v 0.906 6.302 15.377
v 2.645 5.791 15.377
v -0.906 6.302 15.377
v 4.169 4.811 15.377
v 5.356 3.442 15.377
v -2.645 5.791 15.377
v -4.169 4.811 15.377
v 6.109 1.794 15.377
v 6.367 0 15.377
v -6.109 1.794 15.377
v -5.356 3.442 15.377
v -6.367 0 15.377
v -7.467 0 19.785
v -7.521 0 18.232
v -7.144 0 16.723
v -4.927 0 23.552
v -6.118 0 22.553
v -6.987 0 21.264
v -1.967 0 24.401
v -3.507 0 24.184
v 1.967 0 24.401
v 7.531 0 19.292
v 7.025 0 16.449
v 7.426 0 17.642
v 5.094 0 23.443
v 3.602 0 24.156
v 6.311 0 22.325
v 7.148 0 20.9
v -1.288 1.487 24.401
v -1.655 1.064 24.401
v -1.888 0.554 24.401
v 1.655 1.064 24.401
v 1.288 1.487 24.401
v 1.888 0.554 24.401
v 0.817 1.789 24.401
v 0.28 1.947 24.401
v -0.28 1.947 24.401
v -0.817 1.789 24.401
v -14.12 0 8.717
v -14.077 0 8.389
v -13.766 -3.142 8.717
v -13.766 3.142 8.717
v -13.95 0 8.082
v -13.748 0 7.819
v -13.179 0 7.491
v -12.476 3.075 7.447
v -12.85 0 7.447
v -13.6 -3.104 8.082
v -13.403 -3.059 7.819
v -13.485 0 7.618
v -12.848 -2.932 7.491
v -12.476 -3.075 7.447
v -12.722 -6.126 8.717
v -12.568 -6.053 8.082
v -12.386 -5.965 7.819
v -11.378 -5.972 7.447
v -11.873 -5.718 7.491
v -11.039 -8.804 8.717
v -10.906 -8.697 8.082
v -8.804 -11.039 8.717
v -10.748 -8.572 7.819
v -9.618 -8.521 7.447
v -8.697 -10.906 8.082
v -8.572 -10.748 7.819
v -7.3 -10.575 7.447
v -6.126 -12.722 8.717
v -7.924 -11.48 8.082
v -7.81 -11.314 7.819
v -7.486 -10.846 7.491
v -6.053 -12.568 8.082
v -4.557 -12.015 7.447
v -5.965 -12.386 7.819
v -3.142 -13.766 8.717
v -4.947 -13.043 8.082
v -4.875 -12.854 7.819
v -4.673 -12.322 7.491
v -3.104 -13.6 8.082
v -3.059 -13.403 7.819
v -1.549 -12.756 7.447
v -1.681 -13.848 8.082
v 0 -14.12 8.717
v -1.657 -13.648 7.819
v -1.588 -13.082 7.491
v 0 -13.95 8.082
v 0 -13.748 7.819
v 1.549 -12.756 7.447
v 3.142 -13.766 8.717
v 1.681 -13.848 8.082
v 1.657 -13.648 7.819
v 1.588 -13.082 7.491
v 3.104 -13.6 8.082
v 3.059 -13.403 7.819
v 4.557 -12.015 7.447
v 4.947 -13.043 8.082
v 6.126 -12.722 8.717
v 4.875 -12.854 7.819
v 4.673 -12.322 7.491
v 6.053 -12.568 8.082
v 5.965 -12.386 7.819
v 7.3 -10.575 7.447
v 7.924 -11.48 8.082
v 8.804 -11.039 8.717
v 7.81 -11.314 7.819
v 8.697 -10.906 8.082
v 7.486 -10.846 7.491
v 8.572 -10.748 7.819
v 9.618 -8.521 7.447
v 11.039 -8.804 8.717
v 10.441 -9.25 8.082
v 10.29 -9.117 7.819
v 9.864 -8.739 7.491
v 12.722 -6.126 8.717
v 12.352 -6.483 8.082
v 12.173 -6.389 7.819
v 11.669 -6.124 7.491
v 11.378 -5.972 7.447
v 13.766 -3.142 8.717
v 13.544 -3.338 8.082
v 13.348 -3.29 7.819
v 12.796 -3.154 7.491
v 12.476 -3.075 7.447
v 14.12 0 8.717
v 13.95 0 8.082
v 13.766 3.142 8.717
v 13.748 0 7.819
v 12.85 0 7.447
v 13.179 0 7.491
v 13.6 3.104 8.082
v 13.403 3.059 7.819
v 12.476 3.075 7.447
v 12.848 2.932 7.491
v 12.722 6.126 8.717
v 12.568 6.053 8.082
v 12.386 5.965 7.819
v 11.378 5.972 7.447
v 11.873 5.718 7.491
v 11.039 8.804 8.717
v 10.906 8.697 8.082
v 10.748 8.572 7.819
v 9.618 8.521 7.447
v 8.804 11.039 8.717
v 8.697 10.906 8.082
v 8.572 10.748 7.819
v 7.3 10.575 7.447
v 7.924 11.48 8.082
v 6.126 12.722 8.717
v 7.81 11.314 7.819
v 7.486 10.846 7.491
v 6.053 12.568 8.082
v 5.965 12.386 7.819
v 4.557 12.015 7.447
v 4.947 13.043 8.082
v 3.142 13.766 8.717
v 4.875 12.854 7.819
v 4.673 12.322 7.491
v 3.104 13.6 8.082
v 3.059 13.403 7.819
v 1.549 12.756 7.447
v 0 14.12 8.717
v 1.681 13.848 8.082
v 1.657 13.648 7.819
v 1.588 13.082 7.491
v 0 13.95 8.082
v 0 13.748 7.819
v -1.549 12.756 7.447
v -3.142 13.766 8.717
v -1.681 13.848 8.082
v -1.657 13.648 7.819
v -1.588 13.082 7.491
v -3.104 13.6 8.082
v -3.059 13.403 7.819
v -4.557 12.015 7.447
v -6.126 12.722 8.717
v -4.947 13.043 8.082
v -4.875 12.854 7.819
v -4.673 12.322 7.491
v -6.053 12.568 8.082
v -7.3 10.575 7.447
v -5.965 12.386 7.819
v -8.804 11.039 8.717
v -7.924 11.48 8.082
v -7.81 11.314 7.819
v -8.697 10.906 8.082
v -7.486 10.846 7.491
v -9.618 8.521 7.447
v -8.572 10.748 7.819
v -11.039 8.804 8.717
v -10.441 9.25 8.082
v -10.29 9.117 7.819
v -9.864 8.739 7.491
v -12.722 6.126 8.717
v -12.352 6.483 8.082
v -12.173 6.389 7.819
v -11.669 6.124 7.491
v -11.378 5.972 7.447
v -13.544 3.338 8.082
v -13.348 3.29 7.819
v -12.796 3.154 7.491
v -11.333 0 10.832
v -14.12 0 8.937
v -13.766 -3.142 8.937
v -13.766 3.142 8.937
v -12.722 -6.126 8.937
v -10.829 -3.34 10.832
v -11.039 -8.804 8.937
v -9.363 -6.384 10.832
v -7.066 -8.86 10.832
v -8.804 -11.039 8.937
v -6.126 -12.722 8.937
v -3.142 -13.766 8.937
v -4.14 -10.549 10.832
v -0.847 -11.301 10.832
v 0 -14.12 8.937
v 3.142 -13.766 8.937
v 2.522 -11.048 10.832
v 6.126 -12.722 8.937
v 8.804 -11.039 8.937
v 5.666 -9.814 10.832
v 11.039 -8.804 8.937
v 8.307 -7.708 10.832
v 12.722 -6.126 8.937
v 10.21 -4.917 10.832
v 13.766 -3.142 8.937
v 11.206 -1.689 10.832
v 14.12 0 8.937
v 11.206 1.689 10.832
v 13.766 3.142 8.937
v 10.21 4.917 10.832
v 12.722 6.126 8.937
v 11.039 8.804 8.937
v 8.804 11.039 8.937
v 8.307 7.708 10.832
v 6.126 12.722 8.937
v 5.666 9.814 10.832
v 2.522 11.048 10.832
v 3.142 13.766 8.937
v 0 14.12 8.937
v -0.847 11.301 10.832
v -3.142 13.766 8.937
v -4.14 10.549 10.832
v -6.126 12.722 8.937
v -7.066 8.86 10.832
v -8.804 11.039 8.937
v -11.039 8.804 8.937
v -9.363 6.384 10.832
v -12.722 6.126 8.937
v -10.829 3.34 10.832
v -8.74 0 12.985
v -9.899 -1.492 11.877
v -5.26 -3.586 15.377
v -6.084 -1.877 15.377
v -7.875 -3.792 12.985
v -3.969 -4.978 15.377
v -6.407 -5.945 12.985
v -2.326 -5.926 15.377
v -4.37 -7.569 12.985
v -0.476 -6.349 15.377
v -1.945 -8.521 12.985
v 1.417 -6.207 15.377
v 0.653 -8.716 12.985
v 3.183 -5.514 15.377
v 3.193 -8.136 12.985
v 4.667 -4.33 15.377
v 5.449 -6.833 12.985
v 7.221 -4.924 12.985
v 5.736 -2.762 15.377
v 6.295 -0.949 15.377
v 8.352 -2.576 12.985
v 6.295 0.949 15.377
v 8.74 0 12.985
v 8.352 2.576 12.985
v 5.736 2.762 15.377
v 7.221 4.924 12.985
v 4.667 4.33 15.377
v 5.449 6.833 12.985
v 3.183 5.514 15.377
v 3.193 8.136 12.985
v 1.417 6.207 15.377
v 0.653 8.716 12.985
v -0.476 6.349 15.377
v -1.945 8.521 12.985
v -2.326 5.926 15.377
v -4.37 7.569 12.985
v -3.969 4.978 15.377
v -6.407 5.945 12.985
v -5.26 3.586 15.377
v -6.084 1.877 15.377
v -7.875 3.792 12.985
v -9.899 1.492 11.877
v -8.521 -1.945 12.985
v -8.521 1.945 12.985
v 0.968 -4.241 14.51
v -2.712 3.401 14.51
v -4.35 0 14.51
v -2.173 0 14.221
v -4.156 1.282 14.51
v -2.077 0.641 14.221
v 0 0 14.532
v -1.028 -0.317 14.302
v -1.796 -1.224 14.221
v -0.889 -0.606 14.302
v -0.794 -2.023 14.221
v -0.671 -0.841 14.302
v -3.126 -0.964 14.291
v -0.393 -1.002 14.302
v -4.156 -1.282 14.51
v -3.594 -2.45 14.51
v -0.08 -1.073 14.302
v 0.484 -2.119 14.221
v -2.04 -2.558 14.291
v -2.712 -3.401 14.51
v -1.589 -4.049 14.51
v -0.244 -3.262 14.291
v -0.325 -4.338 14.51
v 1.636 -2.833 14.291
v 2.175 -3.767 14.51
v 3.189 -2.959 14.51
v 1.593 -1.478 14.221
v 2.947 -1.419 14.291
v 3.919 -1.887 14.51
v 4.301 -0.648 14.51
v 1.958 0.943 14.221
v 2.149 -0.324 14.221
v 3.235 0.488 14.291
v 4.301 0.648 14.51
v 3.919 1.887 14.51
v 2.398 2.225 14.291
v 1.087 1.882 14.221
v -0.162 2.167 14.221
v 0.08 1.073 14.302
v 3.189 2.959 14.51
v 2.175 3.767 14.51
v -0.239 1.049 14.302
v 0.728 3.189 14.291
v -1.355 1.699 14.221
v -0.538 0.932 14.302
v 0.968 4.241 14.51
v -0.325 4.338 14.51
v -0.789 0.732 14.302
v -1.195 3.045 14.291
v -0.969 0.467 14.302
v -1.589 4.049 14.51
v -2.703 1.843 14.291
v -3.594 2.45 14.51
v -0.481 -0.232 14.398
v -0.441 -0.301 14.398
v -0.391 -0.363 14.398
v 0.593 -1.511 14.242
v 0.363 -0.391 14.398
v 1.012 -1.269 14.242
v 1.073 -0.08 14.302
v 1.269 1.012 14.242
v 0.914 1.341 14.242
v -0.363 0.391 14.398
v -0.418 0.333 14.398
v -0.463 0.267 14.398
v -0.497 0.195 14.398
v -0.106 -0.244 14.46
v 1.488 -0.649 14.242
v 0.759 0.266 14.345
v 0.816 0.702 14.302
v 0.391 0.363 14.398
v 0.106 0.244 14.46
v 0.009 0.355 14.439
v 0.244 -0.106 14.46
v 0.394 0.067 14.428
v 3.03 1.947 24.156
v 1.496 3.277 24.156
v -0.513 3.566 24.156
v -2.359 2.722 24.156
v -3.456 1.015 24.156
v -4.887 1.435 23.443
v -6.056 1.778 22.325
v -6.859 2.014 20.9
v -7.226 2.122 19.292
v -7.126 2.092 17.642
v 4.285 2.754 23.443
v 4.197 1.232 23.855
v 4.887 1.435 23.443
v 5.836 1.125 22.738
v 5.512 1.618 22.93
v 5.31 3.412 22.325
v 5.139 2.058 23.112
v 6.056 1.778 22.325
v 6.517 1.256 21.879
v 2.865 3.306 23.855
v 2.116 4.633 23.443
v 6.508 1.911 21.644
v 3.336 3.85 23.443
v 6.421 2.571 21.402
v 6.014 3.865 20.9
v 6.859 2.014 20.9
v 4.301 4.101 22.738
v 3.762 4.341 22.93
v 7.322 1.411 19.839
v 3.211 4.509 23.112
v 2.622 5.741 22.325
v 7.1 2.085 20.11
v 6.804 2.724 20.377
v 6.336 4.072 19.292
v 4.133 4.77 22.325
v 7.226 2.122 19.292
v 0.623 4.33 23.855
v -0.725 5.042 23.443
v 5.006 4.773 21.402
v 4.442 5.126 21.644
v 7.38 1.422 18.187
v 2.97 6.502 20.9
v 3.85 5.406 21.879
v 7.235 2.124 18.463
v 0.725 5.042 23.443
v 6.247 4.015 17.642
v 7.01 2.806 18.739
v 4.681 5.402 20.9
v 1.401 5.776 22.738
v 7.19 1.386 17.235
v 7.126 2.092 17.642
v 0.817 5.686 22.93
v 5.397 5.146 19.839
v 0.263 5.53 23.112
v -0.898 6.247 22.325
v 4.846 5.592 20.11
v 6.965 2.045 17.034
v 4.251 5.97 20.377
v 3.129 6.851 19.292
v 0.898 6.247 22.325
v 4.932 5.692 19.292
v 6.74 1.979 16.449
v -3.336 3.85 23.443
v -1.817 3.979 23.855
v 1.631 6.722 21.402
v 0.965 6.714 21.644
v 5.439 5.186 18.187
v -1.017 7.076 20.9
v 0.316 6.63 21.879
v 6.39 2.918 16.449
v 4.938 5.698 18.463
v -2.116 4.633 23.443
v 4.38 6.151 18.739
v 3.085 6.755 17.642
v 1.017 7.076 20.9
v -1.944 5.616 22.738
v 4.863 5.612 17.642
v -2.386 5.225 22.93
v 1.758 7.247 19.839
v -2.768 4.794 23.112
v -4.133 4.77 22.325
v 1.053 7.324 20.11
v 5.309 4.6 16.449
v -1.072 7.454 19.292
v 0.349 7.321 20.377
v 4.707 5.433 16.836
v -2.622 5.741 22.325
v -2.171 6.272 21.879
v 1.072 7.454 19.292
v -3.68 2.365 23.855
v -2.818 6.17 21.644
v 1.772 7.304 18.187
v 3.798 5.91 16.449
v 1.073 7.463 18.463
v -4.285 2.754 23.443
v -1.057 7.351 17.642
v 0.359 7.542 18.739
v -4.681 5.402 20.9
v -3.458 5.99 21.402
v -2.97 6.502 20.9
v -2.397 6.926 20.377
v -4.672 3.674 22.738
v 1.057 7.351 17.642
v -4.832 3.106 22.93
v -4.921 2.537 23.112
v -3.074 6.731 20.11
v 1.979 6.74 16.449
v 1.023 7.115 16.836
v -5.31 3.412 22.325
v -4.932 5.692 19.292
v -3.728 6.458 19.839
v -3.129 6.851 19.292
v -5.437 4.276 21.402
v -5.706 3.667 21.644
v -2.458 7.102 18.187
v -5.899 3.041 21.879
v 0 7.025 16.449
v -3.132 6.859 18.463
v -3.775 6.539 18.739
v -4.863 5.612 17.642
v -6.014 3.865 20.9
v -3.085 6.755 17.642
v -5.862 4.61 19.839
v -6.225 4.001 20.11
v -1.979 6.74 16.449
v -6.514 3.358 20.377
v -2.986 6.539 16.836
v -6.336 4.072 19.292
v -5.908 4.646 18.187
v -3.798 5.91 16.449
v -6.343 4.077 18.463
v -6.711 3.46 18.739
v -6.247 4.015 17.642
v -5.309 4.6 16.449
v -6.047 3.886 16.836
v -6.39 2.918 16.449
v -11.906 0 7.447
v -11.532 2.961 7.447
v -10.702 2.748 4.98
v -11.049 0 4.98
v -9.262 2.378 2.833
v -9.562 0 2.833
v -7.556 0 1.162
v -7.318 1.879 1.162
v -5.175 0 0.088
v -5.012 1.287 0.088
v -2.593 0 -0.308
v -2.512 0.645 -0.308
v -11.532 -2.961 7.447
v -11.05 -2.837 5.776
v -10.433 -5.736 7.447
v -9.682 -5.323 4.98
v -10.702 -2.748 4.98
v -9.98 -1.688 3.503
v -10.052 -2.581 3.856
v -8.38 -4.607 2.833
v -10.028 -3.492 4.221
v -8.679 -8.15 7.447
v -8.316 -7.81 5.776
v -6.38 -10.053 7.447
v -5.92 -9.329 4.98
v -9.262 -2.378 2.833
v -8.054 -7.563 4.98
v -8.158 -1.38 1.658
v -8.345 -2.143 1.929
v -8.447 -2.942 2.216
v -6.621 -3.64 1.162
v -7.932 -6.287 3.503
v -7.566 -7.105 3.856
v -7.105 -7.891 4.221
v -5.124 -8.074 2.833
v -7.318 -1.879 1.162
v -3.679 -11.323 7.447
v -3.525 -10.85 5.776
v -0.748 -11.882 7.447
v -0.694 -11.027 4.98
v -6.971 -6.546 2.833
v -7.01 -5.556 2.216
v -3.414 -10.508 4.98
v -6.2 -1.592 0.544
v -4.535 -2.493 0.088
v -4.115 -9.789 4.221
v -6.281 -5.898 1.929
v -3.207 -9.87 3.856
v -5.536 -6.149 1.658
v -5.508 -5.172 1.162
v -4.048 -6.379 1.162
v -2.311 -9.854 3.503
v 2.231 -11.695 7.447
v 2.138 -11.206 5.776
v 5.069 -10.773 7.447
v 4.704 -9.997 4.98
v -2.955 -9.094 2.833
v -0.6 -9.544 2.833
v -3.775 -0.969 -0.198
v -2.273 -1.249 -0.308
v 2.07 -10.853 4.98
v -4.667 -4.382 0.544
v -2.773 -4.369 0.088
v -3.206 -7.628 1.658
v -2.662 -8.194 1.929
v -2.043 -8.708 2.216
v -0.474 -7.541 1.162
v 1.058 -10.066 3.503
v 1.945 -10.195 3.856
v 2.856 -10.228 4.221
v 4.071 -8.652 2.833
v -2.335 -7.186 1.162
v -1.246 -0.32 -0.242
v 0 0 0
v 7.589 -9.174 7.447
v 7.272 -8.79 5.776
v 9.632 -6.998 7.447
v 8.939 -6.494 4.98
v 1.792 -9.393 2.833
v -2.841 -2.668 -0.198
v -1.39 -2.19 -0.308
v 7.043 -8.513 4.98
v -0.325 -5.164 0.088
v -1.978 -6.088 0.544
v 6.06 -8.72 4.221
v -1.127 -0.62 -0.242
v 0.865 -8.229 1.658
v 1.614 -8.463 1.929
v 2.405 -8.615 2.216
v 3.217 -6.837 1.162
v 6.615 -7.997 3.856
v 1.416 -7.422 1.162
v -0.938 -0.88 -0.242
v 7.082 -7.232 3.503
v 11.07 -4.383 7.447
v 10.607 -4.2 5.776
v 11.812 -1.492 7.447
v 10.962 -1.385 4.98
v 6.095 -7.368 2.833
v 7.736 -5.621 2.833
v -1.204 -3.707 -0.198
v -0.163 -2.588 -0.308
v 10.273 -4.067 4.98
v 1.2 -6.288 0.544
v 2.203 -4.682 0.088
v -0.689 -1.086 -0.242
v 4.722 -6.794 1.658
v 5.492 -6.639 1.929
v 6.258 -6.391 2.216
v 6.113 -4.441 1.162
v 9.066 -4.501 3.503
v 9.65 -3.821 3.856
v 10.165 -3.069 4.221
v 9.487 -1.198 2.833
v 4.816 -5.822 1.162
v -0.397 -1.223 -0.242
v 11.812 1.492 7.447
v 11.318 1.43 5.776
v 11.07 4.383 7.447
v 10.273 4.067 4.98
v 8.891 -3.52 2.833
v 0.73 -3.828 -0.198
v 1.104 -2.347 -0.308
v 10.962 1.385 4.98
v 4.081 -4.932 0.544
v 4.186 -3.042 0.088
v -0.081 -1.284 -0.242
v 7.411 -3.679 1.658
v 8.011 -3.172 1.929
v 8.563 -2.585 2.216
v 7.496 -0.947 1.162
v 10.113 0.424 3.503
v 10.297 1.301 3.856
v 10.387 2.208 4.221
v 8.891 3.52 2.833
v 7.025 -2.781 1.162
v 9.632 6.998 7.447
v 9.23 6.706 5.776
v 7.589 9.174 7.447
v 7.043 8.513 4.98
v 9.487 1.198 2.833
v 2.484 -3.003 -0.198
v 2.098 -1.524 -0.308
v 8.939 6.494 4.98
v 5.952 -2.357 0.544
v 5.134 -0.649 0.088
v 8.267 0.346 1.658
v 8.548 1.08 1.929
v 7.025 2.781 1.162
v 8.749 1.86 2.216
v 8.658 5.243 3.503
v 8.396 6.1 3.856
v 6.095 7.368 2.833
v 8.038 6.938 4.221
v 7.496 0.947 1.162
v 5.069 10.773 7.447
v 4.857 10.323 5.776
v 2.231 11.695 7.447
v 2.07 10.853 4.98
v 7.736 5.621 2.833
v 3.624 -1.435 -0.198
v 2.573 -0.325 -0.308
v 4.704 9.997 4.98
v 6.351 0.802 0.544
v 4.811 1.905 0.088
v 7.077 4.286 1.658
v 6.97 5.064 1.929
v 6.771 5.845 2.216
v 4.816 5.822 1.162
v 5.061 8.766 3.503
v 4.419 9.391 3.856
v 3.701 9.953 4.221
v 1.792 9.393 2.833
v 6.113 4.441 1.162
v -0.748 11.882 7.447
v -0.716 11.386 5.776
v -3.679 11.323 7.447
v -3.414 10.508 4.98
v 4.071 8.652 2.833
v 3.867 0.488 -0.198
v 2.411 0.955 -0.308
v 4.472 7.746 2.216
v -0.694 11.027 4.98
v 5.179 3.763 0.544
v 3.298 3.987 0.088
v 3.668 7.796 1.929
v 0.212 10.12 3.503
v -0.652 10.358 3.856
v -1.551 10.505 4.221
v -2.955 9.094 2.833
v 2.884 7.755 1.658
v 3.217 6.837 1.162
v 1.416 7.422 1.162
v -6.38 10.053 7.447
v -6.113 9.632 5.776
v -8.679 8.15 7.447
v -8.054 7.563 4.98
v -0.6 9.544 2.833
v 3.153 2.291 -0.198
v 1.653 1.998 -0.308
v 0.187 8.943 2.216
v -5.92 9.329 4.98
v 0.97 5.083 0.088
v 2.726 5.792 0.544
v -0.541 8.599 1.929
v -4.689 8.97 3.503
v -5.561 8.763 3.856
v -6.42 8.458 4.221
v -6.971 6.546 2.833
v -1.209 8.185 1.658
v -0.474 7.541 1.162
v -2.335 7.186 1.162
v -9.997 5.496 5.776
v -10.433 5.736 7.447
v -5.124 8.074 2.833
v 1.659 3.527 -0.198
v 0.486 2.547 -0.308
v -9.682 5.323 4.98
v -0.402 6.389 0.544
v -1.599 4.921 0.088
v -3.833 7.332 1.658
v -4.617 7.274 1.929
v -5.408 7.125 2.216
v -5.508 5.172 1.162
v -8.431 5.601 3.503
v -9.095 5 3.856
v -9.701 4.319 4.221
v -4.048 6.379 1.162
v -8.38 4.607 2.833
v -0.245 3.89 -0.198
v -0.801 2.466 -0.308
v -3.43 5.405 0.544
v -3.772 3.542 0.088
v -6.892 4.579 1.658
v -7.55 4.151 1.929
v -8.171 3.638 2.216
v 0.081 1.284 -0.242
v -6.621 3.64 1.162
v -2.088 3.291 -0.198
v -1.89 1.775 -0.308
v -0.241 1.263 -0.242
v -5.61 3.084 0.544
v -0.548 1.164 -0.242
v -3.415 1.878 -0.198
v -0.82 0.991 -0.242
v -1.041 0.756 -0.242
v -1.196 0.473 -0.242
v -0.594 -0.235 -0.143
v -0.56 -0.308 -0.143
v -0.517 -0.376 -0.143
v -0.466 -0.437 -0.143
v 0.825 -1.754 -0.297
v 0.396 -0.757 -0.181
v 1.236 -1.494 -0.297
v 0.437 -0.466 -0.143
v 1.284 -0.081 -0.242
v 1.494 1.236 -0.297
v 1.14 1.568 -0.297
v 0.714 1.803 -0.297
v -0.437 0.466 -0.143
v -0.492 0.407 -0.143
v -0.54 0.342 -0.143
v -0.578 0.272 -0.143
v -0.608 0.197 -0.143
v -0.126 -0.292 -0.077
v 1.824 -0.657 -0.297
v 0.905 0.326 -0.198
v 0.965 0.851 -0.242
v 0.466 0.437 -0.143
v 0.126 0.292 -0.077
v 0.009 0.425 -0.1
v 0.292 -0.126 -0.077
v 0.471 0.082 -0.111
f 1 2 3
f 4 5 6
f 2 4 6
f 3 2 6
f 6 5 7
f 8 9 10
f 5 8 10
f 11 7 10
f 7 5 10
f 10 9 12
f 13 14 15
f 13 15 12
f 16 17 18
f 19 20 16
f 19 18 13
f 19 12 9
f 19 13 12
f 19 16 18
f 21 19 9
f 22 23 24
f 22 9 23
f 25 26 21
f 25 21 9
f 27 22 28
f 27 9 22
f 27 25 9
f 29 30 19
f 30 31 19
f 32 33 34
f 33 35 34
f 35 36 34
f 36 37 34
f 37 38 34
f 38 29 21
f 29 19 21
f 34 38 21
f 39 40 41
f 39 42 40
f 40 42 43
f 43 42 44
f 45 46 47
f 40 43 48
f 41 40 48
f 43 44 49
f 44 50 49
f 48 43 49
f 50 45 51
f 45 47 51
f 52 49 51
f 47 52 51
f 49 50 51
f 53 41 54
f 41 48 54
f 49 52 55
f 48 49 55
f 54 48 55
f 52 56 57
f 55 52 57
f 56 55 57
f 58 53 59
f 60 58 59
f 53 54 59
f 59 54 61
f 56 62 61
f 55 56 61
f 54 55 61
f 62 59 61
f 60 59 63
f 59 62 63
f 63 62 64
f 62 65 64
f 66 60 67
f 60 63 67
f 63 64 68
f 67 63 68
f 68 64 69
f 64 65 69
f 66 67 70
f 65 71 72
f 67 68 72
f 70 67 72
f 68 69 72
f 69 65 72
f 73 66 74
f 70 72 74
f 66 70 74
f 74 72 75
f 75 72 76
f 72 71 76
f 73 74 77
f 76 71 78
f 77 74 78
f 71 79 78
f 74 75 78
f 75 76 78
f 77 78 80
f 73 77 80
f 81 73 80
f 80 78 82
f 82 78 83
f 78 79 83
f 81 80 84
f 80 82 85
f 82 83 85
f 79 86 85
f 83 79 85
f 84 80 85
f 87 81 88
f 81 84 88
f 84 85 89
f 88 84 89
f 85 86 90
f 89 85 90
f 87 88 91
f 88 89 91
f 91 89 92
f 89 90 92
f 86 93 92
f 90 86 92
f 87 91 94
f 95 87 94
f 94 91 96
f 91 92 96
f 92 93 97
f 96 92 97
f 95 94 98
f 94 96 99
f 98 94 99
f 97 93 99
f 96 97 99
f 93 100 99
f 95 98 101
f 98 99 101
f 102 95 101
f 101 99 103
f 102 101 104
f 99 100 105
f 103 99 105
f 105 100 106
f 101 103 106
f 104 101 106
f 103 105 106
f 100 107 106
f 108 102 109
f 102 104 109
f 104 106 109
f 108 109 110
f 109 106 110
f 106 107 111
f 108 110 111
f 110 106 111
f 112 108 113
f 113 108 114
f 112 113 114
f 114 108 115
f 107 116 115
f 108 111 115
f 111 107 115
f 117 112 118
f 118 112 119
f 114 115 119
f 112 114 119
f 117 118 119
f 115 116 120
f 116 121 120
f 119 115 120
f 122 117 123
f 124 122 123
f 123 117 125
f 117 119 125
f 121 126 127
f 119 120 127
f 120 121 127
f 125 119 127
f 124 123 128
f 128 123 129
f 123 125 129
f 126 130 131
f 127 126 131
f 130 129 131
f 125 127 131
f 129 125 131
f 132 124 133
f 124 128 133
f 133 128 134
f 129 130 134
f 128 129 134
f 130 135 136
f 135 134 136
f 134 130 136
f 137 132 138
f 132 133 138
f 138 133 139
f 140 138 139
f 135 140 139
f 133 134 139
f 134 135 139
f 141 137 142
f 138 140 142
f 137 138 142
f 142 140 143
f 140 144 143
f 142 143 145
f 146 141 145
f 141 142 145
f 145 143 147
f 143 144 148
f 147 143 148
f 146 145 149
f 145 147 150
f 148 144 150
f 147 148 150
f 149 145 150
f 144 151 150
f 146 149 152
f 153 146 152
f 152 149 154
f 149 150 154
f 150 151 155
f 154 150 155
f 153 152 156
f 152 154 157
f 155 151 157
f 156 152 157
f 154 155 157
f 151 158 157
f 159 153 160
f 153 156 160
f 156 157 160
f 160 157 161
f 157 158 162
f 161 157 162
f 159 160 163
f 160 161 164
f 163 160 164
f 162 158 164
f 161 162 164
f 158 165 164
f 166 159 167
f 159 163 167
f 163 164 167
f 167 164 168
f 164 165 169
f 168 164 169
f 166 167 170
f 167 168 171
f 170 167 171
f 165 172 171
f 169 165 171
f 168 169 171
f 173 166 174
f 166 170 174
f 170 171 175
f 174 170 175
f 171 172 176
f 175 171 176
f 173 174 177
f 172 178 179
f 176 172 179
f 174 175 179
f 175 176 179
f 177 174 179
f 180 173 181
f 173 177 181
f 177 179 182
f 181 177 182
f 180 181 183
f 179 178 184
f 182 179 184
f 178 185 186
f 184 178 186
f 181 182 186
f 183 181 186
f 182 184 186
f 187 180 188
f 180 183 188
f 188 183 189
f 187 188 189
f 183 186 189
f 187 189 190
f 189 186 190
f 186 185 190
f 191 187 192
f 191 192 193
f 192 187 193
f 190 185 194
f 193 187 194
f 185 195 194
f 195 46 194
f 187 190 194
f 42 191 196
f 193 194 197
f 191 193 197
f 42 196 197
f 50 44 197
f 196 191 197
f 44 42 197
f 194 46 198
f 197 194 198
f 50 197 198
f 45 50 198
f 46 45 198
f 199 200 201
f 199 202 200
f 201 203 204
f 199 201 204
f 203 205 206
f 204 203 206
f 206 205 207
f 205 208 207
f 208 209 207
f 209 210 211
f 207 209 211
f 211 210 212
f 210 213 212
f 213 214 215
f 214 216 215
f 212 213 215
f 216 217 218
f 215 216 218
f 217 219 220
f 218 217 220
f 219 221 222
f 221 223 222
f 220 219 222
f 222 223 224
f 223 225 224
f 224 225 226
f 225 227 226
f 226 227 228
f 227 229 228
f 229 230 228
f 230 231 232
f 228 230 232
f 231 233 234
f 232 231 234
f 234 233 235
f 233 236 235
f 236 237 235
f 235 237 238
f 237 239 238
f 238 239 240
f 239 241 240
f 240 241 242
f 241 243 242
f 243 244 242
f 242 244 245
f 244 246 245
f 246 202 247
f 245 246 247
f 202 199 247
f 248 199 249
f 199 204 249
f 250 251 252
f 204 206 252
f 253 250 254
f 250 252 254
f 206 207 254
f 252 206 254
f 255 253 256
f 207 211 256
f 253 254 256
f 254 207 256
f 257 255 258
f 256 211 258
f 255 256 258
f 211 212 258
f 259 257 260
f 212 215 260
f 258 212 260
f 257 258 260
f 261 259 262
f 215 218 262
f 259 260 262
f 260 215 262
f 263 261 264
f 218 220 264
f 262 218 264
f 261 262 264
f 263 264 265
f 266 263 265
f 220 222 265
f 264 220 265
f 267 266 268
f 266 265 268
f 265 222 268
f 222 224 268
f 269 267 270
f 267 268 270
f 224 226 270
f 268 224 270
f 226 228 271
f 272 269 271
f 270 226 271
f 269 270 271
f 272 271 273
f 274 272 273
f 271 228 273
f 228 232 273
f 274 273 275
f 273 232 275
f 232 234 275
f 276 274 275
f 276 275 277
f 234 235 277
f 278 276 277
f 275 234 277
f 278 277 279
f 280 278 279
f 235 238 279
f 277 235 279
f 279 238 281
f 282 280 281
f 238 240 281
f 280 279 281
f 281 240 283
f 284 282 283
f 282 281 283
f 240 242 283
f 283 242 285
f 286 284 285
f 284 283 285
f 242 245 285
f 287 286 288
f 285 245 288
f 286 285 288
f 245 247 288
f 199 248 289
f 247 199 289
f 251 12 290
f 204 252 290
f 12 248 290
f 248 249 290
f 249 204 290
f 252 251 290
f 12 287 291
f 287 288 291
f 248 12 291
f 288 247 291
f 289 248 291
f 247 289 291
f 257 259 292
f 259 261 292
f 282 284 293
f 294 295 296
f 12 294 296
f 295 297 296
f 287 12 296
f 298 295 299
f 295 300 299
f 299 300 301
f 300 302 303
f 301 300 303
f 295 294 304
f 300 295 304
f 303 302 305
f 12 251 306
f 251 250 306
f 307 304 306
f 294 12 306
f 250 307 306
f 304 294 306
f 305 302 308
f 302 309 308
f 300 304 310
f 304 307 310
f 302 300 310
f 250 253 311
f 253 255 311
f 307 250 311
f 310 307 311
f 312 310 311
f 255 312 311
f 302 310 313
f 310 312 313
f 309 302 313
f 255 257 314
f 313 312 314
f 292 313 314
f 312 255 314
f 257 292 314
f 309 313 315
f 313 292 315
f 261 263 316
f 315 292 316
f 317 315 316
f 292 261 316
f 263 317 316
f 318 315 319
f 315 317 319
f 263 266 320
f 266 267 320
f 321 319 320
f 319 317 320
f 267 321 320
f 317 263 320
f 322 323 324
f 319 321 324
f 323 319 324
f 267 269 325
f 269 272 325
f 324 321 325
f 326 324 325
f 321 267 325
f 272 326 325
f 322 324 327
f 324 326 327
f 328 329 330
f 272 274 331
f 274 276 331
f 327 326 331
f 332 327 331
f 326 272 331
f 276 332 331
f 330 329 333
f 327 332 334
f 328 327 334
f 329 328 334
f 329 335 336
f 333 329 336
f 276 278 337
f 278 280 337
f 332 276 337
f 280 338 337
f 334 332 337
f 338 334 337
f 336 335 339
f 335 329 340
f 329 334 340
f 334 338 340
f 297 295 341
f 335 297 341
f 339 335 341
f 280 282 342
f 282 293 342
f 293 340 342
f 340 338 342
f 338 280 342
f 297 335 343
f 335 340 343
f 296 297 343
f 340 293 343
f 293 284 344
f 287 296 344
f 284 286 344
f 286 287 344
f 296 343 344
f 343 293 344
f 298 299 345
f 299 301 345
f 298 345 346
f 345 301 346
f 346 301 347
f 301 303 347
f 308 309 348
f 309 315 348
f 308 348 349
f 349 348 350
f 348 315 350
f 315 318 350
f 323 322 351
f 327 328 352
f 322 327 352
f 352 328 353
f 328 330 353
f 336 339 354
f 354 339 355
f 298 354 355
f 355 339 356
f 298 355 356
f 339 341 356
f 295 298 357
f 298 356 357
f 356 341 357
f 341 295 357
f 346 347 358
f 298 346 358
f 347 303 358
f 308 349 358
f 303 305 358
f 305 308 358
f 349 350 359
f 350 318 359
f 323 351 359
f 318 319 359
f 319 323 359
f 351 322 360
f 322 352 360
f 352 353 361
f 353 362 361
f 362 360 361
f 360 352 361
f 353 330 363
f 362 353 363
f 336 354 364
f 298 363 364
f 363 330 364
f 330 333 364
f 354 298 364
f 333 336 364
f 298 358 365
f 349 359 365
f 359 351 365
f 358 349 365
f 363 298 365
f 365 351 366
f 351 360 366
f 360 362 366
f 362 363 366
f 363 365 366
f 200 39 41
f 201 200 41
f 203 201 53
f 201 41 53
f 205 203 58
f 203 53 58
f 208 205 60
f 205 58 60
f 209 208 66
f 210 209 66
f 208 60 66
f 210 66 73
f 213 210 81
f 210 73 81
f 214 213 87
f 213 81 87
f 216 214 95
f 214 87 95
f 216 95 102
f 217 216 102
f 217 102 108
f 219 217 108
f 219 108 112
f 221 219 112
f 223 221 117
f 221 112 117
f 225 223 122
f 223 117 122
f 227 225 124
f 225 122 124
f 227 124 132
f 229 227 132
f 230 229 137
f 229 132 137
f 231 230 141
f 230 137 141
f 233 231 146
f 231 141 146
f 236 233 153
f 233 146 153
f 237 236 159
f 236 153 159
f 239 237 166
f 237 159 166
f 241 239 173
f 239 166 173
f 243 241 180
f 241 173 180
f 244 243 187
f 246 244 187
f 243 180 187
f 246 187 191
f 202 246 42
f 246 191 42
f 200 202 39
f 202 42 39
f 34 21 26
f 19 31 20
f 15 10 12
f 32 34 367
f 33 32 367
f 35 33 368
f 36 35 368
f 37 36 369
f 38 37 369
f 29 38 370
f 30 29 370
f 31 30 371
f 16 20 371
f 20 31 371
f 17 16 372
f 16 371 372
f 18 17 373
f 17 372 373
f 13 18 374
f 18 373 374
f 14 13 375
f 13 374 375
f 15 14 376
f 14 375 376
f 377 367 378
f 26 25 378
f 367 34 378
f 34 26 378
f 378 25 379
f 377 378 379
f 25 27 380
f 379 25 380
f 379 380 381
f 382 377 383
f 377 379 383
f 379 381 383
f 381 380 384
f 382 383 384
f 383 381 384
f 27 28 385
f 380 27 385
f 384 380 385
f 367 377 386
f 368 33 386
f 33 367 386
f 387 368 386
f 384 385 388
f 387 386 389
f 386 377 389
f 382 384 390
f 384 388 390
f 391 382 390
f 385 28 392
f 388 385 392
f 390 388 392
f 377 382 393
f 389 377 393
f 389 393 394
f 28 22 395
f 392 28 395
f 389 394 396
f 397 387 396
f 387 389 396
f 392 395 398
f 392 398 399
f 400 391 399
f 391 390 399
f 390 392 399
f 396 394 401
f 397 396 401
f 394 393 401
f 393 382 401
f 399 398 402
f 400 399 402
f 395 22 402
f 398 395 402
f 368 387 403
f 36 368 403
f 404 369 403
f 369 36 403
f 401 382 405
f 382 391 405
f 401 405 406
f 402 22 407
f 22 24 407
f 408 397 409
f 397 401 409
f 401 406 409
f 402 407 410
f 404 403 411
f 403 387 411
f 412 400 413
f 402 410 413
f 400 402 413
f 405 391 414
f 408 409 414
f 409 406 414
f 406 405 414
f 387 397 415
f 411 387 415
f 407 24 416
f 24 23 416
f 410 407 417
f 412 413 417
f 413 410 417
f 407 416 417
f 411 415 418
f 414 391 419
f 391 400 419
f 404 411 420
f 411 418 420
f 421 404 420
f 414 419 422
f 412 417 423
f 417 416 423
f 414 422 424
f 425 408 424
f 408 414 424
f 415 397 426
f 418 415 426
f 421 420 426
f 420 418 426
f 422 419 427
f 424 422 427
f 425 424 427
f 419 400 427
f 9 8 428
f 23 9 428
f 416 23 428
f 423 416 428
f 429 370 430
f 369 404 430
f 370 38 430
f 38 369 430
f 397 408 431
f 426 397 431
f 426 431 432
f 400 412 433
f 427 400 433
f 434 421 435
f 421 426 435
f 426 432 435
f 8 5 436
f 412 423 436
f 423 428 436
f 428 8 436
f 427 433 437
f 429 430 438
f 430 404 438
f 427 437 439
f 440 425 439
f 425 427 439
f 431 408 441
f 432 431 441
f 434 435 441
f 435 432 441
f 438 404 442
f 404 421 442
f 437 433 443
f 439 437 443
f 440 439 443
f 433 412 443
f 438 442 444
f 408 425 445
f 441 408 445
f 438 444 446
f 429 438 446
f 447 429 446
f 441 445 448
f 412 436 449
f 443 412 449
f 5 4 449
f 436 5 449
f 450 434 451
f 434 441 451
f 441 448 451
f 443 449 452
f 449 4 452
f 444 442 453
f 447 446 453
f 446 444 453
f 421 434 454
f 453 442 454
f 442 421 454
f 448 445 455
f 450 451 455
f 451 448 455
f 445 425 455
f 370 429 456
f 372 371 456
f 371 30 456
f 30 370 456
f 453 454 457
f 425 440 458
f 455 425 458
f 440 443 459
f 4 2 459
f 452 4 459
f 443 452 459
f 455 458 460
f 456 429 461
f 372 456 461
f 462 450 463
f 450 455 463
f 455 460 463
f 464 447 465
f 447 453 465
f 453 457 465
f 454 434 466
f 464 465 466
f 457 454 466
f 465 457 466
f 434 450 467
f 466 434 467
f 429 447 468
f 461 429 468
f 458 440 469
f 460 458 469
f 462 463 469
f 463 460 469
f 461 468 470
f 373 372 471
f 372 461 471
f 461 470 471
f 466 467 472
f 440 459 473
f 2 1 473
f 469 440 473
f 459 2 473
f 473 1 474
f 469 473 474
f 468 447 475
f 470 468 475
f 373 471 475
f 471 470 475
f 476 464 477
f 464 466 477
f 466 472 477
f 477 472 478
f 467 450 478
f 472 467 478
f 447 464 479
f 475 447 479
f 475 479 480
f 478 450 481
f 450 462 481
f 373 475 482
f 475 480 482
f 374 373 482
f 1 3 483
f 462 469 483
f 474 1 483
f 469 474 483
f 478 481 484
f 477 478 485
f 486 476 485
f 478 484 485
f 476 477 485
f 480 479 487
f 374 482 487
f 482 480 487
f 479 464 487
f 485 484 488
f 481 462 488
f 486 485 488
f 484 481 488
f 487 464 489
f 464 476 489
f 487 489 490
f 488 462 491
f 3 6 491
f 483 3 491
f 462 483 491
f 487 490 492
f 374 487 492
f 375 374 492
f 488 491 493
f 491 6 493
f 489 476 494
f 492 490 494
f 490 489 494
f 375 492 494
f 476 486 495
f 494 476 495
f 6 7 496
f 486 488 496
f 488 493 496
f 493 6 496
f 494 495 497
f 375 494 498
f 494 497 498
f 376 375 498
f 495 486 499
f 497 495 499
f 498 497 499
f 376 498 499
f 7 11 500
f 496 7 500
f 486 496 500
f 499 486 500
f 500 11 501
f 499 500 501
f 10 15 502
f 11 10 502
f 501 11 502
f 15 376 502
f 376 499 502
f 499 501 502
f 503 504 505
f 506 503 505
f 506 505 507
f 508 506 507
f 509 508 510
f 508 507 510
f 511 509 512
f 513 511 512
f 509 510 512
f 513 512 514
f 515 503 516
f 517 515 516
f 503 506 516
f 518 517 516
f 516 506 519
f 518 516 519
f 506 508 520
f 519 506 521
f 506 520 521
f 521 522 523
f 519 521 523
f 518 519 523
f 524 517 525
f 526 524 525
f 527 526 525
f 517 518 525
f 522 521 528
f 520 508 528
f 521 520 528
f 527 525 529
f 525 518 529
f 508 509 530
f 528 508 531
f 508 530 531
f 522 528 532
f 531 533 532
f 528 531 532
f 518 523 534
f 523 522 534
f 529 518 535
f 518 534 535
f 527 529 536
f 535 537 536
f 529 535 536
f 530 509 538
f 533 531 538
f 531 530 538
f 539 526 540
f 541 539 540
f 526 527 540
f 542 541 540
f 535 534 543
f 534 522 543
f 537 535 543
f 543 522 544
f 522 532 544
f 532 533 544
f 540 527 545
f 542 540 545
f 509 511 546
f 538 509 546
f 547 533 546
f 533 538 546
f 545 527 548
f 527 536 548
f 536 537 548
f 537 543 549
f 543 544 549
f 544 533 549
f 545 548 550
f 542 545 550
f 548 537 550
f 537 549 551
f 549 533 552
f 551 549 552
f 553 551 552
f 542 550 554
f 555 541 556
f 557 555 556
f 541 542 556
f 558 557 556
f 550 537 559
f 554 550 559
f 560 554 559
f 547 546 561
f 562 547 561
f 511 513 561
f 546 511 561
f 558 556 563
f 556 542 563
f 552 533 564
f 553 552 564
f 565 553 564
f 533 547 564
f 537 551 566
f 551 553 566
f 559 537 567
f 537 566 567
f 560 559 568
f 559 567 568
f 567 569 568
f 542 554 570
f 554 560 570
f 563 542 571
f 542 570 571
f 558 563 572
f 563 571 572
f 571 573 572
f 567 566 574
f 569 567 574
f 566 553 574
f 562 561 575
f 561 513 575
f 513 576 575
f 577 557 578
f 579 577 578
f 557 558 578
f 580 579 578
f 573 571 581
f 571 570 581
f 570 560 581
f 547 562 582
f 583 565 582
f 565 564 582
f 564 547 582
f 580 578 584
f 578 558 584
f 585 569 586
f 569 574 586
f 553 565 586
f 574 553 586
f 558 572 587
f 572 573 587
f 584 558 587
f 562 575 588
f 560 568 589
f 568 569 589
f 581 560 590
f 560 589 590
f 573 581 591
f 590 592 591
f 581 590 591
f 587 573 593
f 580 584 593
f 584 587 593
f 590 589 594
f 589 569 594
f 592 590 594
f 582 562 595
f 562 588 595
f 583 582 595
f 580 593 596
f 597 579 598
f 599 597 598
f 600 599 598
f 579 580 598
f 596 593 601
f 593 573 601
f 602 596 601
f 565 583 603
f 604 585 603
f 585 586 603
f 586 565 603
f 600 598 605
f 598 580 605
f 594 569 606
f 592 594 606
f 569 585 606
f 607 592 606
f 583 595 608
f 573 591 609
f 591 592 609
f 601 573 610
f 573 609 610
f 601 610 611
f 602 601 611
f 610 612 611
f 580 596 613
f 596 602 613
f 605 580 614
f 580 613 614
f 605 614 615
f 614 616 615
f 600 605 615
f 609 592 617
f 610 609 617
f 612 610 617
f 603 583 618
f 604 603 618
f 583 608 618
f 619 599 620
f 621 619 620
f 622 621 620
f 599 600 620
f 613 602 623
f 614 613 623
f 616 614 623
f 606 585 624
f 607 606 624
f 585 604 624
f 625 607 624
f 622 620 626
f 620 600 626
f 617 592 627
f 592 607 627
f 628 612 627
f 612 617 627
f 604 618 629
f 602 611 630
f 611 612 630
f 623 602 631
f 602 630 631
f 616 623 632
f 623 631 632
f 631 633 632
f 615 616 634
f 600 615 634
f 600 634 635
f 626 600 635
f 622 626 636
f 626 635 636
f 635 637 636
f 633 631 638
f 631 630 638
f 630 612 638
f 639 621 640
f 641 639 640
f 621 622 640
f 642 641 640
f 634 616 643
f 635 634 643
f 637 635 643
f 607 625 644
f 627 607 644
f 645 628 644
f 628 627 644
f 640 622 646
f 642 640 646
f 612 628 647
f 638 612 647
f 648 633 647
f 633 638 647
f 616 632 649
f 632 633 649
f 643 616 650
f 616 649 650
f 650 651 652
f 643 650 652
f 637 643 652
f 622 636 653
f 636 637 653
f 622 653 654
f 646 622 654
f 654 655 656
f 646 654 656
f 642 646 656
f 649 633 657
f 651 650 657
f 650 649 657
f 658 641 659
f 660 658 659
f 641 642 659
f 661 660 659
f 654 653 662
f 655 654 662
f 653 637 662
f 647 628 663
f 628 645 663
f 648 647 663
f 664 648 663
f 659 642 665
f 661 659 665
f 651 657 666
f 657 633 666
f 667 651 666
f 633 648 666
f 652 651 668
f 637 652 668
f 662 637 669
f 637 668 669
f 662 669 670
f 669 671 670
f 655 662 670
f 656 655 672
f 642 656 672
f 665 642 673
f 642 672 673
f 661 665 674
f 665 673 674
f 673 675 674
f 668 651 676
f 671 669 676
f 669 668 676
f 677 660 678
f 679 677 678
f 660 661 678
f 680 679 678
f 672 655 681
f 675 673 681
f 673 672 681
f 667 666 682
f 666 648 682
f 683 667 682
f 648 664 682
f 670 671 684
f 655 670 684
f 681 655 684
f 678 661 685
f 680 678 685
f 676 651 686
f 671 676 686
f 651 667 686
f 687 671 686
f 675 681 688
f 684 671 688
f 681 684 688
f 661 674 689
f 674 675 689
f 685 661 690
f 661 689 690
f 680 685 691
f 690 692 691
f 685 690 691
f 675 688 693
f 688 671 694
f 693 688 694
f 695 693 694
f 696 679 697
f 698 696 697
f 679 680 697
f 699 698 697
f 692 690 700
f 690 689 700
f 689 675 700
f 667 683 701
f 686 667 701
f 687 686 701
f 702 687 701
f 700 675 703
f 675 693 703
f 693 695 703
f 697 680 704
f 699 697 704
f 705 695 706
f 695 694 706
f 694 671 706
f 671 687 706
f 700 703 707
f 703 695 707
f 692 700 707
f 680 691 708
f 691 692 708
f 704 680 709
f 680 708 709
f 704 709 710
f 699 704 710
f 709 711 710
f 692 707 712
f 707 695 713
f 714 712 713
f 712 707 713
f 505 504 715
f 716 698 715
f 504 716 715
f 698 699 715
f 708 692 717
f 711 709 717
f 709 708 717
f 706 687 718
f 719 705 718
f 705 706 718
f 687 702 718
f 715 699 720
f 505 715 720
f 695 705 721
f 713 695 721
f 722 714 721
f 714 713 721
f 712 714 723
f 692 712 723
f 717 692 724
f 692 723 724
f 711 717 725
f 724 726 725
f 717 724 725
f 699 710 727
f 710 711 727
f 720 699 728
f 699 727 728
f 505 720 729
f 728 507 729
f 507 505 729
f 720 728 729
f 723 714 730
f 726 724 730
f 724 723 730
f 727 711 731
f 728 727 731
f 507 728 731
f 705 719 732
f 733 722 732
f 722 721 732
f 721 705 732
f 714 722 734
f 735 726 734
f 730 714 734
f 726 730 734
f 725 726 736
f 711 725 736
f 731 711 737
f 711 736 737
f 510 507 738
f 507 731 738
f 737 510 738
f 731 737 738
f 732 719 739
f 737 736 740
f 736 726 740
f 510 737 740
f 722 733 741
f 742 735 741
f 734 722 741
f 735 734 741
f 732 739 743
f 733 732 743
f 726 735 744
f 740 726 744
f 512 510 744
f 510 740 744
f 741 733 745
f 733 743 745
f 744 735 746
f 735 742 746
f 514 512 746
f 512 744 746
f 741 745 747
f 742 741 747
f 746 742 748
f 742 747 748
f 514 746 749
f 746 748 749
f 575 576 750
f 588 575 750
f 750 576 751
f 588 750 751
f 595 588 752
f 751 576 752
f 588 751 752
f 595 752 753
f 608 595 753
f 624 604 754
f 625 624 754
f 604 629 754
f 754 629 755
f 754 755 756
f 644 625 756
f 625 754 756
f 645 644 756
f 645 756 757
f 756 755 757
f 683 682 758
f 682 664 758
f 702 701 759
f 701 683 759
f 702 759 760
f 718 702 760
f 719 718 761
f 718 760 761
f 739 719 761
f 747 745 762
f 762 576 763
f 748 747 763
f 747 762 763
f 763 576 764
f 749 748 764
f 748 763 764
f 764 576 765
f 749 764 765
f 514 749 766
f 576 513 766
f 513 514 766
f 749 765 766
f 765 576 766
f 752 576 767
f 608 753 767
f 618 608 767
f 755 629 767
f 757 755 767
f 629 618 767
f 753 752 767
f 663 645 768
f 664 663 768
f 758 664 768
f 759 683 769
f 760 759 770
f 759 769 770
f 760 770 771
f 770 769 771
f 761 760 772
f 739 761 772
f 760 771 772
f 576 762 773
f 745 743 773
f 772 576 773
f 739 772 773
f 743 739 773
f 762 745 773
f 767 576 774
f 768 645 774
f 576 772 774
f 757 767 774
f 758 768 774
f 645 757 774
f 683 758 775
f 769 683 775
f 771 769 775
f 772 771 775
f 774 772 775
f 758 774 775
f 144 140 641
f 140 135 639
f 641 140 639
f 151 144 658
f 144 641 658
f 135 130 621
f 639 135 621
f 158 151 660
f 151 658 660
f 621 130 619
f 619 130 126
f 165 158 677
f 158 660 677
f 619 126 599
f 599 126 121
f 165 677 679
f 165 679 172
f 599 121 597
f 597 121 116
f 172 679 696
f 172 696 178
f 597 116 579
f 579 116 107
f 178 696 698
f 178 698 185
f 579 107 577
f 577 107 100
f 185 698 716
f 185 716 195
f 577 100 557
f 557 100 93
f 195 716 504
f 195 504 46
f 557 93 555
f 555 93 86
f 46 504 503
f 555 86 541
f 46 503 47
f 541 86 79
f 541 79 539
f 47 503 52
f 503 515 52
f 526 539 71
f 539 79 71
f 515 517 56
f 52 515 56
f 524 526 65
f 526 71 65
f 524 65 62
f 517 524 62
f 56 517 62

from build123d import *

# Parameters (mm, degrees)
F2_R     = 1.27
F5_W     = 28.0556213111
F5_H     = 15.8260483295
F6_DEPTH = 25.4


with BuildPart() as f1:
    # F0 (on Front) → F1 (revolve)
    with BuildSketch(Plane.XZ):
        with BuildLine():
            ThreePointArc((-11.905984953, 7.4474178255), (-7.5556070937, 1.1616523766), (0, 0))
            Line((0, 0), (0, 7.4474178255))
            Line((0, 7.4474178255), (-11.905984953, 7.4474178255))
        make_face()
        with BuildLine():
            Line((-11.905984953, 7.4474178255), (0, 7.4474178255))
            Line((0, 7.4474178255), (0, 14.5316230621))
            ThreePointArc((0, 14.5316230621), (-3.2714384324, 14.29073486), (-6.3665207505, 15.3773819909))
            ThreePointArc((-6.3665207505, 15.3773819909), (-10.0104927669, 11.8772257791), (-14.119816944, 8.9373141527))
            Line((-14.119816944, 8.9373141527), (-14.119816944, 7.4474178255))
            Line((-14.119816944, 7.4474178255), (-11.905984953, 7.4474178255))
        make_face()
    revolve(axis=Axis((0, 0, 34.3446284533), (0, 0, 1)))

    # F2
    f2_edges = [f1.edges().sort_by_distance(p)[0] for p in [
        (14.119817, 0, 7.447418),
    ]]
    fillet(f2_edges, radius=F2_R)


with BuildPart() as f4:
    # F3 (on Front) → F4 (revolve)
    with BuildSketch(Plane.XZ):
        with BuildLine():
            Line((-6.3665207505, 15.3773819909), (0, 15.3773819909))
            Line((0, 15.3773819909), (0, 24.4007859645))
            Line((0, 24.4007859645), (-1.9672751456, 24.4007859645))
            ThreePointArc((-1.9672751456, 24.4007859645), (-6.986617263, 21.2638021926), (-6.3665207505, 15.3773819909))
        make_face()
    revolve(axis=Axis((0, 0, 22.8794236608), (0, 0, 1)))

    # F5 (on Front) → F6 (cut)
    with BuildSketch(Plane.XZ):
        with Locations((1.4464305714, 21.0229521617)):
            Rectangle(F5_W, F5_H)
    extrude(amount=F6_DEPTH, mode=Mode.SUBTRACT)


solid = Compound([f1.part, f4.part])
